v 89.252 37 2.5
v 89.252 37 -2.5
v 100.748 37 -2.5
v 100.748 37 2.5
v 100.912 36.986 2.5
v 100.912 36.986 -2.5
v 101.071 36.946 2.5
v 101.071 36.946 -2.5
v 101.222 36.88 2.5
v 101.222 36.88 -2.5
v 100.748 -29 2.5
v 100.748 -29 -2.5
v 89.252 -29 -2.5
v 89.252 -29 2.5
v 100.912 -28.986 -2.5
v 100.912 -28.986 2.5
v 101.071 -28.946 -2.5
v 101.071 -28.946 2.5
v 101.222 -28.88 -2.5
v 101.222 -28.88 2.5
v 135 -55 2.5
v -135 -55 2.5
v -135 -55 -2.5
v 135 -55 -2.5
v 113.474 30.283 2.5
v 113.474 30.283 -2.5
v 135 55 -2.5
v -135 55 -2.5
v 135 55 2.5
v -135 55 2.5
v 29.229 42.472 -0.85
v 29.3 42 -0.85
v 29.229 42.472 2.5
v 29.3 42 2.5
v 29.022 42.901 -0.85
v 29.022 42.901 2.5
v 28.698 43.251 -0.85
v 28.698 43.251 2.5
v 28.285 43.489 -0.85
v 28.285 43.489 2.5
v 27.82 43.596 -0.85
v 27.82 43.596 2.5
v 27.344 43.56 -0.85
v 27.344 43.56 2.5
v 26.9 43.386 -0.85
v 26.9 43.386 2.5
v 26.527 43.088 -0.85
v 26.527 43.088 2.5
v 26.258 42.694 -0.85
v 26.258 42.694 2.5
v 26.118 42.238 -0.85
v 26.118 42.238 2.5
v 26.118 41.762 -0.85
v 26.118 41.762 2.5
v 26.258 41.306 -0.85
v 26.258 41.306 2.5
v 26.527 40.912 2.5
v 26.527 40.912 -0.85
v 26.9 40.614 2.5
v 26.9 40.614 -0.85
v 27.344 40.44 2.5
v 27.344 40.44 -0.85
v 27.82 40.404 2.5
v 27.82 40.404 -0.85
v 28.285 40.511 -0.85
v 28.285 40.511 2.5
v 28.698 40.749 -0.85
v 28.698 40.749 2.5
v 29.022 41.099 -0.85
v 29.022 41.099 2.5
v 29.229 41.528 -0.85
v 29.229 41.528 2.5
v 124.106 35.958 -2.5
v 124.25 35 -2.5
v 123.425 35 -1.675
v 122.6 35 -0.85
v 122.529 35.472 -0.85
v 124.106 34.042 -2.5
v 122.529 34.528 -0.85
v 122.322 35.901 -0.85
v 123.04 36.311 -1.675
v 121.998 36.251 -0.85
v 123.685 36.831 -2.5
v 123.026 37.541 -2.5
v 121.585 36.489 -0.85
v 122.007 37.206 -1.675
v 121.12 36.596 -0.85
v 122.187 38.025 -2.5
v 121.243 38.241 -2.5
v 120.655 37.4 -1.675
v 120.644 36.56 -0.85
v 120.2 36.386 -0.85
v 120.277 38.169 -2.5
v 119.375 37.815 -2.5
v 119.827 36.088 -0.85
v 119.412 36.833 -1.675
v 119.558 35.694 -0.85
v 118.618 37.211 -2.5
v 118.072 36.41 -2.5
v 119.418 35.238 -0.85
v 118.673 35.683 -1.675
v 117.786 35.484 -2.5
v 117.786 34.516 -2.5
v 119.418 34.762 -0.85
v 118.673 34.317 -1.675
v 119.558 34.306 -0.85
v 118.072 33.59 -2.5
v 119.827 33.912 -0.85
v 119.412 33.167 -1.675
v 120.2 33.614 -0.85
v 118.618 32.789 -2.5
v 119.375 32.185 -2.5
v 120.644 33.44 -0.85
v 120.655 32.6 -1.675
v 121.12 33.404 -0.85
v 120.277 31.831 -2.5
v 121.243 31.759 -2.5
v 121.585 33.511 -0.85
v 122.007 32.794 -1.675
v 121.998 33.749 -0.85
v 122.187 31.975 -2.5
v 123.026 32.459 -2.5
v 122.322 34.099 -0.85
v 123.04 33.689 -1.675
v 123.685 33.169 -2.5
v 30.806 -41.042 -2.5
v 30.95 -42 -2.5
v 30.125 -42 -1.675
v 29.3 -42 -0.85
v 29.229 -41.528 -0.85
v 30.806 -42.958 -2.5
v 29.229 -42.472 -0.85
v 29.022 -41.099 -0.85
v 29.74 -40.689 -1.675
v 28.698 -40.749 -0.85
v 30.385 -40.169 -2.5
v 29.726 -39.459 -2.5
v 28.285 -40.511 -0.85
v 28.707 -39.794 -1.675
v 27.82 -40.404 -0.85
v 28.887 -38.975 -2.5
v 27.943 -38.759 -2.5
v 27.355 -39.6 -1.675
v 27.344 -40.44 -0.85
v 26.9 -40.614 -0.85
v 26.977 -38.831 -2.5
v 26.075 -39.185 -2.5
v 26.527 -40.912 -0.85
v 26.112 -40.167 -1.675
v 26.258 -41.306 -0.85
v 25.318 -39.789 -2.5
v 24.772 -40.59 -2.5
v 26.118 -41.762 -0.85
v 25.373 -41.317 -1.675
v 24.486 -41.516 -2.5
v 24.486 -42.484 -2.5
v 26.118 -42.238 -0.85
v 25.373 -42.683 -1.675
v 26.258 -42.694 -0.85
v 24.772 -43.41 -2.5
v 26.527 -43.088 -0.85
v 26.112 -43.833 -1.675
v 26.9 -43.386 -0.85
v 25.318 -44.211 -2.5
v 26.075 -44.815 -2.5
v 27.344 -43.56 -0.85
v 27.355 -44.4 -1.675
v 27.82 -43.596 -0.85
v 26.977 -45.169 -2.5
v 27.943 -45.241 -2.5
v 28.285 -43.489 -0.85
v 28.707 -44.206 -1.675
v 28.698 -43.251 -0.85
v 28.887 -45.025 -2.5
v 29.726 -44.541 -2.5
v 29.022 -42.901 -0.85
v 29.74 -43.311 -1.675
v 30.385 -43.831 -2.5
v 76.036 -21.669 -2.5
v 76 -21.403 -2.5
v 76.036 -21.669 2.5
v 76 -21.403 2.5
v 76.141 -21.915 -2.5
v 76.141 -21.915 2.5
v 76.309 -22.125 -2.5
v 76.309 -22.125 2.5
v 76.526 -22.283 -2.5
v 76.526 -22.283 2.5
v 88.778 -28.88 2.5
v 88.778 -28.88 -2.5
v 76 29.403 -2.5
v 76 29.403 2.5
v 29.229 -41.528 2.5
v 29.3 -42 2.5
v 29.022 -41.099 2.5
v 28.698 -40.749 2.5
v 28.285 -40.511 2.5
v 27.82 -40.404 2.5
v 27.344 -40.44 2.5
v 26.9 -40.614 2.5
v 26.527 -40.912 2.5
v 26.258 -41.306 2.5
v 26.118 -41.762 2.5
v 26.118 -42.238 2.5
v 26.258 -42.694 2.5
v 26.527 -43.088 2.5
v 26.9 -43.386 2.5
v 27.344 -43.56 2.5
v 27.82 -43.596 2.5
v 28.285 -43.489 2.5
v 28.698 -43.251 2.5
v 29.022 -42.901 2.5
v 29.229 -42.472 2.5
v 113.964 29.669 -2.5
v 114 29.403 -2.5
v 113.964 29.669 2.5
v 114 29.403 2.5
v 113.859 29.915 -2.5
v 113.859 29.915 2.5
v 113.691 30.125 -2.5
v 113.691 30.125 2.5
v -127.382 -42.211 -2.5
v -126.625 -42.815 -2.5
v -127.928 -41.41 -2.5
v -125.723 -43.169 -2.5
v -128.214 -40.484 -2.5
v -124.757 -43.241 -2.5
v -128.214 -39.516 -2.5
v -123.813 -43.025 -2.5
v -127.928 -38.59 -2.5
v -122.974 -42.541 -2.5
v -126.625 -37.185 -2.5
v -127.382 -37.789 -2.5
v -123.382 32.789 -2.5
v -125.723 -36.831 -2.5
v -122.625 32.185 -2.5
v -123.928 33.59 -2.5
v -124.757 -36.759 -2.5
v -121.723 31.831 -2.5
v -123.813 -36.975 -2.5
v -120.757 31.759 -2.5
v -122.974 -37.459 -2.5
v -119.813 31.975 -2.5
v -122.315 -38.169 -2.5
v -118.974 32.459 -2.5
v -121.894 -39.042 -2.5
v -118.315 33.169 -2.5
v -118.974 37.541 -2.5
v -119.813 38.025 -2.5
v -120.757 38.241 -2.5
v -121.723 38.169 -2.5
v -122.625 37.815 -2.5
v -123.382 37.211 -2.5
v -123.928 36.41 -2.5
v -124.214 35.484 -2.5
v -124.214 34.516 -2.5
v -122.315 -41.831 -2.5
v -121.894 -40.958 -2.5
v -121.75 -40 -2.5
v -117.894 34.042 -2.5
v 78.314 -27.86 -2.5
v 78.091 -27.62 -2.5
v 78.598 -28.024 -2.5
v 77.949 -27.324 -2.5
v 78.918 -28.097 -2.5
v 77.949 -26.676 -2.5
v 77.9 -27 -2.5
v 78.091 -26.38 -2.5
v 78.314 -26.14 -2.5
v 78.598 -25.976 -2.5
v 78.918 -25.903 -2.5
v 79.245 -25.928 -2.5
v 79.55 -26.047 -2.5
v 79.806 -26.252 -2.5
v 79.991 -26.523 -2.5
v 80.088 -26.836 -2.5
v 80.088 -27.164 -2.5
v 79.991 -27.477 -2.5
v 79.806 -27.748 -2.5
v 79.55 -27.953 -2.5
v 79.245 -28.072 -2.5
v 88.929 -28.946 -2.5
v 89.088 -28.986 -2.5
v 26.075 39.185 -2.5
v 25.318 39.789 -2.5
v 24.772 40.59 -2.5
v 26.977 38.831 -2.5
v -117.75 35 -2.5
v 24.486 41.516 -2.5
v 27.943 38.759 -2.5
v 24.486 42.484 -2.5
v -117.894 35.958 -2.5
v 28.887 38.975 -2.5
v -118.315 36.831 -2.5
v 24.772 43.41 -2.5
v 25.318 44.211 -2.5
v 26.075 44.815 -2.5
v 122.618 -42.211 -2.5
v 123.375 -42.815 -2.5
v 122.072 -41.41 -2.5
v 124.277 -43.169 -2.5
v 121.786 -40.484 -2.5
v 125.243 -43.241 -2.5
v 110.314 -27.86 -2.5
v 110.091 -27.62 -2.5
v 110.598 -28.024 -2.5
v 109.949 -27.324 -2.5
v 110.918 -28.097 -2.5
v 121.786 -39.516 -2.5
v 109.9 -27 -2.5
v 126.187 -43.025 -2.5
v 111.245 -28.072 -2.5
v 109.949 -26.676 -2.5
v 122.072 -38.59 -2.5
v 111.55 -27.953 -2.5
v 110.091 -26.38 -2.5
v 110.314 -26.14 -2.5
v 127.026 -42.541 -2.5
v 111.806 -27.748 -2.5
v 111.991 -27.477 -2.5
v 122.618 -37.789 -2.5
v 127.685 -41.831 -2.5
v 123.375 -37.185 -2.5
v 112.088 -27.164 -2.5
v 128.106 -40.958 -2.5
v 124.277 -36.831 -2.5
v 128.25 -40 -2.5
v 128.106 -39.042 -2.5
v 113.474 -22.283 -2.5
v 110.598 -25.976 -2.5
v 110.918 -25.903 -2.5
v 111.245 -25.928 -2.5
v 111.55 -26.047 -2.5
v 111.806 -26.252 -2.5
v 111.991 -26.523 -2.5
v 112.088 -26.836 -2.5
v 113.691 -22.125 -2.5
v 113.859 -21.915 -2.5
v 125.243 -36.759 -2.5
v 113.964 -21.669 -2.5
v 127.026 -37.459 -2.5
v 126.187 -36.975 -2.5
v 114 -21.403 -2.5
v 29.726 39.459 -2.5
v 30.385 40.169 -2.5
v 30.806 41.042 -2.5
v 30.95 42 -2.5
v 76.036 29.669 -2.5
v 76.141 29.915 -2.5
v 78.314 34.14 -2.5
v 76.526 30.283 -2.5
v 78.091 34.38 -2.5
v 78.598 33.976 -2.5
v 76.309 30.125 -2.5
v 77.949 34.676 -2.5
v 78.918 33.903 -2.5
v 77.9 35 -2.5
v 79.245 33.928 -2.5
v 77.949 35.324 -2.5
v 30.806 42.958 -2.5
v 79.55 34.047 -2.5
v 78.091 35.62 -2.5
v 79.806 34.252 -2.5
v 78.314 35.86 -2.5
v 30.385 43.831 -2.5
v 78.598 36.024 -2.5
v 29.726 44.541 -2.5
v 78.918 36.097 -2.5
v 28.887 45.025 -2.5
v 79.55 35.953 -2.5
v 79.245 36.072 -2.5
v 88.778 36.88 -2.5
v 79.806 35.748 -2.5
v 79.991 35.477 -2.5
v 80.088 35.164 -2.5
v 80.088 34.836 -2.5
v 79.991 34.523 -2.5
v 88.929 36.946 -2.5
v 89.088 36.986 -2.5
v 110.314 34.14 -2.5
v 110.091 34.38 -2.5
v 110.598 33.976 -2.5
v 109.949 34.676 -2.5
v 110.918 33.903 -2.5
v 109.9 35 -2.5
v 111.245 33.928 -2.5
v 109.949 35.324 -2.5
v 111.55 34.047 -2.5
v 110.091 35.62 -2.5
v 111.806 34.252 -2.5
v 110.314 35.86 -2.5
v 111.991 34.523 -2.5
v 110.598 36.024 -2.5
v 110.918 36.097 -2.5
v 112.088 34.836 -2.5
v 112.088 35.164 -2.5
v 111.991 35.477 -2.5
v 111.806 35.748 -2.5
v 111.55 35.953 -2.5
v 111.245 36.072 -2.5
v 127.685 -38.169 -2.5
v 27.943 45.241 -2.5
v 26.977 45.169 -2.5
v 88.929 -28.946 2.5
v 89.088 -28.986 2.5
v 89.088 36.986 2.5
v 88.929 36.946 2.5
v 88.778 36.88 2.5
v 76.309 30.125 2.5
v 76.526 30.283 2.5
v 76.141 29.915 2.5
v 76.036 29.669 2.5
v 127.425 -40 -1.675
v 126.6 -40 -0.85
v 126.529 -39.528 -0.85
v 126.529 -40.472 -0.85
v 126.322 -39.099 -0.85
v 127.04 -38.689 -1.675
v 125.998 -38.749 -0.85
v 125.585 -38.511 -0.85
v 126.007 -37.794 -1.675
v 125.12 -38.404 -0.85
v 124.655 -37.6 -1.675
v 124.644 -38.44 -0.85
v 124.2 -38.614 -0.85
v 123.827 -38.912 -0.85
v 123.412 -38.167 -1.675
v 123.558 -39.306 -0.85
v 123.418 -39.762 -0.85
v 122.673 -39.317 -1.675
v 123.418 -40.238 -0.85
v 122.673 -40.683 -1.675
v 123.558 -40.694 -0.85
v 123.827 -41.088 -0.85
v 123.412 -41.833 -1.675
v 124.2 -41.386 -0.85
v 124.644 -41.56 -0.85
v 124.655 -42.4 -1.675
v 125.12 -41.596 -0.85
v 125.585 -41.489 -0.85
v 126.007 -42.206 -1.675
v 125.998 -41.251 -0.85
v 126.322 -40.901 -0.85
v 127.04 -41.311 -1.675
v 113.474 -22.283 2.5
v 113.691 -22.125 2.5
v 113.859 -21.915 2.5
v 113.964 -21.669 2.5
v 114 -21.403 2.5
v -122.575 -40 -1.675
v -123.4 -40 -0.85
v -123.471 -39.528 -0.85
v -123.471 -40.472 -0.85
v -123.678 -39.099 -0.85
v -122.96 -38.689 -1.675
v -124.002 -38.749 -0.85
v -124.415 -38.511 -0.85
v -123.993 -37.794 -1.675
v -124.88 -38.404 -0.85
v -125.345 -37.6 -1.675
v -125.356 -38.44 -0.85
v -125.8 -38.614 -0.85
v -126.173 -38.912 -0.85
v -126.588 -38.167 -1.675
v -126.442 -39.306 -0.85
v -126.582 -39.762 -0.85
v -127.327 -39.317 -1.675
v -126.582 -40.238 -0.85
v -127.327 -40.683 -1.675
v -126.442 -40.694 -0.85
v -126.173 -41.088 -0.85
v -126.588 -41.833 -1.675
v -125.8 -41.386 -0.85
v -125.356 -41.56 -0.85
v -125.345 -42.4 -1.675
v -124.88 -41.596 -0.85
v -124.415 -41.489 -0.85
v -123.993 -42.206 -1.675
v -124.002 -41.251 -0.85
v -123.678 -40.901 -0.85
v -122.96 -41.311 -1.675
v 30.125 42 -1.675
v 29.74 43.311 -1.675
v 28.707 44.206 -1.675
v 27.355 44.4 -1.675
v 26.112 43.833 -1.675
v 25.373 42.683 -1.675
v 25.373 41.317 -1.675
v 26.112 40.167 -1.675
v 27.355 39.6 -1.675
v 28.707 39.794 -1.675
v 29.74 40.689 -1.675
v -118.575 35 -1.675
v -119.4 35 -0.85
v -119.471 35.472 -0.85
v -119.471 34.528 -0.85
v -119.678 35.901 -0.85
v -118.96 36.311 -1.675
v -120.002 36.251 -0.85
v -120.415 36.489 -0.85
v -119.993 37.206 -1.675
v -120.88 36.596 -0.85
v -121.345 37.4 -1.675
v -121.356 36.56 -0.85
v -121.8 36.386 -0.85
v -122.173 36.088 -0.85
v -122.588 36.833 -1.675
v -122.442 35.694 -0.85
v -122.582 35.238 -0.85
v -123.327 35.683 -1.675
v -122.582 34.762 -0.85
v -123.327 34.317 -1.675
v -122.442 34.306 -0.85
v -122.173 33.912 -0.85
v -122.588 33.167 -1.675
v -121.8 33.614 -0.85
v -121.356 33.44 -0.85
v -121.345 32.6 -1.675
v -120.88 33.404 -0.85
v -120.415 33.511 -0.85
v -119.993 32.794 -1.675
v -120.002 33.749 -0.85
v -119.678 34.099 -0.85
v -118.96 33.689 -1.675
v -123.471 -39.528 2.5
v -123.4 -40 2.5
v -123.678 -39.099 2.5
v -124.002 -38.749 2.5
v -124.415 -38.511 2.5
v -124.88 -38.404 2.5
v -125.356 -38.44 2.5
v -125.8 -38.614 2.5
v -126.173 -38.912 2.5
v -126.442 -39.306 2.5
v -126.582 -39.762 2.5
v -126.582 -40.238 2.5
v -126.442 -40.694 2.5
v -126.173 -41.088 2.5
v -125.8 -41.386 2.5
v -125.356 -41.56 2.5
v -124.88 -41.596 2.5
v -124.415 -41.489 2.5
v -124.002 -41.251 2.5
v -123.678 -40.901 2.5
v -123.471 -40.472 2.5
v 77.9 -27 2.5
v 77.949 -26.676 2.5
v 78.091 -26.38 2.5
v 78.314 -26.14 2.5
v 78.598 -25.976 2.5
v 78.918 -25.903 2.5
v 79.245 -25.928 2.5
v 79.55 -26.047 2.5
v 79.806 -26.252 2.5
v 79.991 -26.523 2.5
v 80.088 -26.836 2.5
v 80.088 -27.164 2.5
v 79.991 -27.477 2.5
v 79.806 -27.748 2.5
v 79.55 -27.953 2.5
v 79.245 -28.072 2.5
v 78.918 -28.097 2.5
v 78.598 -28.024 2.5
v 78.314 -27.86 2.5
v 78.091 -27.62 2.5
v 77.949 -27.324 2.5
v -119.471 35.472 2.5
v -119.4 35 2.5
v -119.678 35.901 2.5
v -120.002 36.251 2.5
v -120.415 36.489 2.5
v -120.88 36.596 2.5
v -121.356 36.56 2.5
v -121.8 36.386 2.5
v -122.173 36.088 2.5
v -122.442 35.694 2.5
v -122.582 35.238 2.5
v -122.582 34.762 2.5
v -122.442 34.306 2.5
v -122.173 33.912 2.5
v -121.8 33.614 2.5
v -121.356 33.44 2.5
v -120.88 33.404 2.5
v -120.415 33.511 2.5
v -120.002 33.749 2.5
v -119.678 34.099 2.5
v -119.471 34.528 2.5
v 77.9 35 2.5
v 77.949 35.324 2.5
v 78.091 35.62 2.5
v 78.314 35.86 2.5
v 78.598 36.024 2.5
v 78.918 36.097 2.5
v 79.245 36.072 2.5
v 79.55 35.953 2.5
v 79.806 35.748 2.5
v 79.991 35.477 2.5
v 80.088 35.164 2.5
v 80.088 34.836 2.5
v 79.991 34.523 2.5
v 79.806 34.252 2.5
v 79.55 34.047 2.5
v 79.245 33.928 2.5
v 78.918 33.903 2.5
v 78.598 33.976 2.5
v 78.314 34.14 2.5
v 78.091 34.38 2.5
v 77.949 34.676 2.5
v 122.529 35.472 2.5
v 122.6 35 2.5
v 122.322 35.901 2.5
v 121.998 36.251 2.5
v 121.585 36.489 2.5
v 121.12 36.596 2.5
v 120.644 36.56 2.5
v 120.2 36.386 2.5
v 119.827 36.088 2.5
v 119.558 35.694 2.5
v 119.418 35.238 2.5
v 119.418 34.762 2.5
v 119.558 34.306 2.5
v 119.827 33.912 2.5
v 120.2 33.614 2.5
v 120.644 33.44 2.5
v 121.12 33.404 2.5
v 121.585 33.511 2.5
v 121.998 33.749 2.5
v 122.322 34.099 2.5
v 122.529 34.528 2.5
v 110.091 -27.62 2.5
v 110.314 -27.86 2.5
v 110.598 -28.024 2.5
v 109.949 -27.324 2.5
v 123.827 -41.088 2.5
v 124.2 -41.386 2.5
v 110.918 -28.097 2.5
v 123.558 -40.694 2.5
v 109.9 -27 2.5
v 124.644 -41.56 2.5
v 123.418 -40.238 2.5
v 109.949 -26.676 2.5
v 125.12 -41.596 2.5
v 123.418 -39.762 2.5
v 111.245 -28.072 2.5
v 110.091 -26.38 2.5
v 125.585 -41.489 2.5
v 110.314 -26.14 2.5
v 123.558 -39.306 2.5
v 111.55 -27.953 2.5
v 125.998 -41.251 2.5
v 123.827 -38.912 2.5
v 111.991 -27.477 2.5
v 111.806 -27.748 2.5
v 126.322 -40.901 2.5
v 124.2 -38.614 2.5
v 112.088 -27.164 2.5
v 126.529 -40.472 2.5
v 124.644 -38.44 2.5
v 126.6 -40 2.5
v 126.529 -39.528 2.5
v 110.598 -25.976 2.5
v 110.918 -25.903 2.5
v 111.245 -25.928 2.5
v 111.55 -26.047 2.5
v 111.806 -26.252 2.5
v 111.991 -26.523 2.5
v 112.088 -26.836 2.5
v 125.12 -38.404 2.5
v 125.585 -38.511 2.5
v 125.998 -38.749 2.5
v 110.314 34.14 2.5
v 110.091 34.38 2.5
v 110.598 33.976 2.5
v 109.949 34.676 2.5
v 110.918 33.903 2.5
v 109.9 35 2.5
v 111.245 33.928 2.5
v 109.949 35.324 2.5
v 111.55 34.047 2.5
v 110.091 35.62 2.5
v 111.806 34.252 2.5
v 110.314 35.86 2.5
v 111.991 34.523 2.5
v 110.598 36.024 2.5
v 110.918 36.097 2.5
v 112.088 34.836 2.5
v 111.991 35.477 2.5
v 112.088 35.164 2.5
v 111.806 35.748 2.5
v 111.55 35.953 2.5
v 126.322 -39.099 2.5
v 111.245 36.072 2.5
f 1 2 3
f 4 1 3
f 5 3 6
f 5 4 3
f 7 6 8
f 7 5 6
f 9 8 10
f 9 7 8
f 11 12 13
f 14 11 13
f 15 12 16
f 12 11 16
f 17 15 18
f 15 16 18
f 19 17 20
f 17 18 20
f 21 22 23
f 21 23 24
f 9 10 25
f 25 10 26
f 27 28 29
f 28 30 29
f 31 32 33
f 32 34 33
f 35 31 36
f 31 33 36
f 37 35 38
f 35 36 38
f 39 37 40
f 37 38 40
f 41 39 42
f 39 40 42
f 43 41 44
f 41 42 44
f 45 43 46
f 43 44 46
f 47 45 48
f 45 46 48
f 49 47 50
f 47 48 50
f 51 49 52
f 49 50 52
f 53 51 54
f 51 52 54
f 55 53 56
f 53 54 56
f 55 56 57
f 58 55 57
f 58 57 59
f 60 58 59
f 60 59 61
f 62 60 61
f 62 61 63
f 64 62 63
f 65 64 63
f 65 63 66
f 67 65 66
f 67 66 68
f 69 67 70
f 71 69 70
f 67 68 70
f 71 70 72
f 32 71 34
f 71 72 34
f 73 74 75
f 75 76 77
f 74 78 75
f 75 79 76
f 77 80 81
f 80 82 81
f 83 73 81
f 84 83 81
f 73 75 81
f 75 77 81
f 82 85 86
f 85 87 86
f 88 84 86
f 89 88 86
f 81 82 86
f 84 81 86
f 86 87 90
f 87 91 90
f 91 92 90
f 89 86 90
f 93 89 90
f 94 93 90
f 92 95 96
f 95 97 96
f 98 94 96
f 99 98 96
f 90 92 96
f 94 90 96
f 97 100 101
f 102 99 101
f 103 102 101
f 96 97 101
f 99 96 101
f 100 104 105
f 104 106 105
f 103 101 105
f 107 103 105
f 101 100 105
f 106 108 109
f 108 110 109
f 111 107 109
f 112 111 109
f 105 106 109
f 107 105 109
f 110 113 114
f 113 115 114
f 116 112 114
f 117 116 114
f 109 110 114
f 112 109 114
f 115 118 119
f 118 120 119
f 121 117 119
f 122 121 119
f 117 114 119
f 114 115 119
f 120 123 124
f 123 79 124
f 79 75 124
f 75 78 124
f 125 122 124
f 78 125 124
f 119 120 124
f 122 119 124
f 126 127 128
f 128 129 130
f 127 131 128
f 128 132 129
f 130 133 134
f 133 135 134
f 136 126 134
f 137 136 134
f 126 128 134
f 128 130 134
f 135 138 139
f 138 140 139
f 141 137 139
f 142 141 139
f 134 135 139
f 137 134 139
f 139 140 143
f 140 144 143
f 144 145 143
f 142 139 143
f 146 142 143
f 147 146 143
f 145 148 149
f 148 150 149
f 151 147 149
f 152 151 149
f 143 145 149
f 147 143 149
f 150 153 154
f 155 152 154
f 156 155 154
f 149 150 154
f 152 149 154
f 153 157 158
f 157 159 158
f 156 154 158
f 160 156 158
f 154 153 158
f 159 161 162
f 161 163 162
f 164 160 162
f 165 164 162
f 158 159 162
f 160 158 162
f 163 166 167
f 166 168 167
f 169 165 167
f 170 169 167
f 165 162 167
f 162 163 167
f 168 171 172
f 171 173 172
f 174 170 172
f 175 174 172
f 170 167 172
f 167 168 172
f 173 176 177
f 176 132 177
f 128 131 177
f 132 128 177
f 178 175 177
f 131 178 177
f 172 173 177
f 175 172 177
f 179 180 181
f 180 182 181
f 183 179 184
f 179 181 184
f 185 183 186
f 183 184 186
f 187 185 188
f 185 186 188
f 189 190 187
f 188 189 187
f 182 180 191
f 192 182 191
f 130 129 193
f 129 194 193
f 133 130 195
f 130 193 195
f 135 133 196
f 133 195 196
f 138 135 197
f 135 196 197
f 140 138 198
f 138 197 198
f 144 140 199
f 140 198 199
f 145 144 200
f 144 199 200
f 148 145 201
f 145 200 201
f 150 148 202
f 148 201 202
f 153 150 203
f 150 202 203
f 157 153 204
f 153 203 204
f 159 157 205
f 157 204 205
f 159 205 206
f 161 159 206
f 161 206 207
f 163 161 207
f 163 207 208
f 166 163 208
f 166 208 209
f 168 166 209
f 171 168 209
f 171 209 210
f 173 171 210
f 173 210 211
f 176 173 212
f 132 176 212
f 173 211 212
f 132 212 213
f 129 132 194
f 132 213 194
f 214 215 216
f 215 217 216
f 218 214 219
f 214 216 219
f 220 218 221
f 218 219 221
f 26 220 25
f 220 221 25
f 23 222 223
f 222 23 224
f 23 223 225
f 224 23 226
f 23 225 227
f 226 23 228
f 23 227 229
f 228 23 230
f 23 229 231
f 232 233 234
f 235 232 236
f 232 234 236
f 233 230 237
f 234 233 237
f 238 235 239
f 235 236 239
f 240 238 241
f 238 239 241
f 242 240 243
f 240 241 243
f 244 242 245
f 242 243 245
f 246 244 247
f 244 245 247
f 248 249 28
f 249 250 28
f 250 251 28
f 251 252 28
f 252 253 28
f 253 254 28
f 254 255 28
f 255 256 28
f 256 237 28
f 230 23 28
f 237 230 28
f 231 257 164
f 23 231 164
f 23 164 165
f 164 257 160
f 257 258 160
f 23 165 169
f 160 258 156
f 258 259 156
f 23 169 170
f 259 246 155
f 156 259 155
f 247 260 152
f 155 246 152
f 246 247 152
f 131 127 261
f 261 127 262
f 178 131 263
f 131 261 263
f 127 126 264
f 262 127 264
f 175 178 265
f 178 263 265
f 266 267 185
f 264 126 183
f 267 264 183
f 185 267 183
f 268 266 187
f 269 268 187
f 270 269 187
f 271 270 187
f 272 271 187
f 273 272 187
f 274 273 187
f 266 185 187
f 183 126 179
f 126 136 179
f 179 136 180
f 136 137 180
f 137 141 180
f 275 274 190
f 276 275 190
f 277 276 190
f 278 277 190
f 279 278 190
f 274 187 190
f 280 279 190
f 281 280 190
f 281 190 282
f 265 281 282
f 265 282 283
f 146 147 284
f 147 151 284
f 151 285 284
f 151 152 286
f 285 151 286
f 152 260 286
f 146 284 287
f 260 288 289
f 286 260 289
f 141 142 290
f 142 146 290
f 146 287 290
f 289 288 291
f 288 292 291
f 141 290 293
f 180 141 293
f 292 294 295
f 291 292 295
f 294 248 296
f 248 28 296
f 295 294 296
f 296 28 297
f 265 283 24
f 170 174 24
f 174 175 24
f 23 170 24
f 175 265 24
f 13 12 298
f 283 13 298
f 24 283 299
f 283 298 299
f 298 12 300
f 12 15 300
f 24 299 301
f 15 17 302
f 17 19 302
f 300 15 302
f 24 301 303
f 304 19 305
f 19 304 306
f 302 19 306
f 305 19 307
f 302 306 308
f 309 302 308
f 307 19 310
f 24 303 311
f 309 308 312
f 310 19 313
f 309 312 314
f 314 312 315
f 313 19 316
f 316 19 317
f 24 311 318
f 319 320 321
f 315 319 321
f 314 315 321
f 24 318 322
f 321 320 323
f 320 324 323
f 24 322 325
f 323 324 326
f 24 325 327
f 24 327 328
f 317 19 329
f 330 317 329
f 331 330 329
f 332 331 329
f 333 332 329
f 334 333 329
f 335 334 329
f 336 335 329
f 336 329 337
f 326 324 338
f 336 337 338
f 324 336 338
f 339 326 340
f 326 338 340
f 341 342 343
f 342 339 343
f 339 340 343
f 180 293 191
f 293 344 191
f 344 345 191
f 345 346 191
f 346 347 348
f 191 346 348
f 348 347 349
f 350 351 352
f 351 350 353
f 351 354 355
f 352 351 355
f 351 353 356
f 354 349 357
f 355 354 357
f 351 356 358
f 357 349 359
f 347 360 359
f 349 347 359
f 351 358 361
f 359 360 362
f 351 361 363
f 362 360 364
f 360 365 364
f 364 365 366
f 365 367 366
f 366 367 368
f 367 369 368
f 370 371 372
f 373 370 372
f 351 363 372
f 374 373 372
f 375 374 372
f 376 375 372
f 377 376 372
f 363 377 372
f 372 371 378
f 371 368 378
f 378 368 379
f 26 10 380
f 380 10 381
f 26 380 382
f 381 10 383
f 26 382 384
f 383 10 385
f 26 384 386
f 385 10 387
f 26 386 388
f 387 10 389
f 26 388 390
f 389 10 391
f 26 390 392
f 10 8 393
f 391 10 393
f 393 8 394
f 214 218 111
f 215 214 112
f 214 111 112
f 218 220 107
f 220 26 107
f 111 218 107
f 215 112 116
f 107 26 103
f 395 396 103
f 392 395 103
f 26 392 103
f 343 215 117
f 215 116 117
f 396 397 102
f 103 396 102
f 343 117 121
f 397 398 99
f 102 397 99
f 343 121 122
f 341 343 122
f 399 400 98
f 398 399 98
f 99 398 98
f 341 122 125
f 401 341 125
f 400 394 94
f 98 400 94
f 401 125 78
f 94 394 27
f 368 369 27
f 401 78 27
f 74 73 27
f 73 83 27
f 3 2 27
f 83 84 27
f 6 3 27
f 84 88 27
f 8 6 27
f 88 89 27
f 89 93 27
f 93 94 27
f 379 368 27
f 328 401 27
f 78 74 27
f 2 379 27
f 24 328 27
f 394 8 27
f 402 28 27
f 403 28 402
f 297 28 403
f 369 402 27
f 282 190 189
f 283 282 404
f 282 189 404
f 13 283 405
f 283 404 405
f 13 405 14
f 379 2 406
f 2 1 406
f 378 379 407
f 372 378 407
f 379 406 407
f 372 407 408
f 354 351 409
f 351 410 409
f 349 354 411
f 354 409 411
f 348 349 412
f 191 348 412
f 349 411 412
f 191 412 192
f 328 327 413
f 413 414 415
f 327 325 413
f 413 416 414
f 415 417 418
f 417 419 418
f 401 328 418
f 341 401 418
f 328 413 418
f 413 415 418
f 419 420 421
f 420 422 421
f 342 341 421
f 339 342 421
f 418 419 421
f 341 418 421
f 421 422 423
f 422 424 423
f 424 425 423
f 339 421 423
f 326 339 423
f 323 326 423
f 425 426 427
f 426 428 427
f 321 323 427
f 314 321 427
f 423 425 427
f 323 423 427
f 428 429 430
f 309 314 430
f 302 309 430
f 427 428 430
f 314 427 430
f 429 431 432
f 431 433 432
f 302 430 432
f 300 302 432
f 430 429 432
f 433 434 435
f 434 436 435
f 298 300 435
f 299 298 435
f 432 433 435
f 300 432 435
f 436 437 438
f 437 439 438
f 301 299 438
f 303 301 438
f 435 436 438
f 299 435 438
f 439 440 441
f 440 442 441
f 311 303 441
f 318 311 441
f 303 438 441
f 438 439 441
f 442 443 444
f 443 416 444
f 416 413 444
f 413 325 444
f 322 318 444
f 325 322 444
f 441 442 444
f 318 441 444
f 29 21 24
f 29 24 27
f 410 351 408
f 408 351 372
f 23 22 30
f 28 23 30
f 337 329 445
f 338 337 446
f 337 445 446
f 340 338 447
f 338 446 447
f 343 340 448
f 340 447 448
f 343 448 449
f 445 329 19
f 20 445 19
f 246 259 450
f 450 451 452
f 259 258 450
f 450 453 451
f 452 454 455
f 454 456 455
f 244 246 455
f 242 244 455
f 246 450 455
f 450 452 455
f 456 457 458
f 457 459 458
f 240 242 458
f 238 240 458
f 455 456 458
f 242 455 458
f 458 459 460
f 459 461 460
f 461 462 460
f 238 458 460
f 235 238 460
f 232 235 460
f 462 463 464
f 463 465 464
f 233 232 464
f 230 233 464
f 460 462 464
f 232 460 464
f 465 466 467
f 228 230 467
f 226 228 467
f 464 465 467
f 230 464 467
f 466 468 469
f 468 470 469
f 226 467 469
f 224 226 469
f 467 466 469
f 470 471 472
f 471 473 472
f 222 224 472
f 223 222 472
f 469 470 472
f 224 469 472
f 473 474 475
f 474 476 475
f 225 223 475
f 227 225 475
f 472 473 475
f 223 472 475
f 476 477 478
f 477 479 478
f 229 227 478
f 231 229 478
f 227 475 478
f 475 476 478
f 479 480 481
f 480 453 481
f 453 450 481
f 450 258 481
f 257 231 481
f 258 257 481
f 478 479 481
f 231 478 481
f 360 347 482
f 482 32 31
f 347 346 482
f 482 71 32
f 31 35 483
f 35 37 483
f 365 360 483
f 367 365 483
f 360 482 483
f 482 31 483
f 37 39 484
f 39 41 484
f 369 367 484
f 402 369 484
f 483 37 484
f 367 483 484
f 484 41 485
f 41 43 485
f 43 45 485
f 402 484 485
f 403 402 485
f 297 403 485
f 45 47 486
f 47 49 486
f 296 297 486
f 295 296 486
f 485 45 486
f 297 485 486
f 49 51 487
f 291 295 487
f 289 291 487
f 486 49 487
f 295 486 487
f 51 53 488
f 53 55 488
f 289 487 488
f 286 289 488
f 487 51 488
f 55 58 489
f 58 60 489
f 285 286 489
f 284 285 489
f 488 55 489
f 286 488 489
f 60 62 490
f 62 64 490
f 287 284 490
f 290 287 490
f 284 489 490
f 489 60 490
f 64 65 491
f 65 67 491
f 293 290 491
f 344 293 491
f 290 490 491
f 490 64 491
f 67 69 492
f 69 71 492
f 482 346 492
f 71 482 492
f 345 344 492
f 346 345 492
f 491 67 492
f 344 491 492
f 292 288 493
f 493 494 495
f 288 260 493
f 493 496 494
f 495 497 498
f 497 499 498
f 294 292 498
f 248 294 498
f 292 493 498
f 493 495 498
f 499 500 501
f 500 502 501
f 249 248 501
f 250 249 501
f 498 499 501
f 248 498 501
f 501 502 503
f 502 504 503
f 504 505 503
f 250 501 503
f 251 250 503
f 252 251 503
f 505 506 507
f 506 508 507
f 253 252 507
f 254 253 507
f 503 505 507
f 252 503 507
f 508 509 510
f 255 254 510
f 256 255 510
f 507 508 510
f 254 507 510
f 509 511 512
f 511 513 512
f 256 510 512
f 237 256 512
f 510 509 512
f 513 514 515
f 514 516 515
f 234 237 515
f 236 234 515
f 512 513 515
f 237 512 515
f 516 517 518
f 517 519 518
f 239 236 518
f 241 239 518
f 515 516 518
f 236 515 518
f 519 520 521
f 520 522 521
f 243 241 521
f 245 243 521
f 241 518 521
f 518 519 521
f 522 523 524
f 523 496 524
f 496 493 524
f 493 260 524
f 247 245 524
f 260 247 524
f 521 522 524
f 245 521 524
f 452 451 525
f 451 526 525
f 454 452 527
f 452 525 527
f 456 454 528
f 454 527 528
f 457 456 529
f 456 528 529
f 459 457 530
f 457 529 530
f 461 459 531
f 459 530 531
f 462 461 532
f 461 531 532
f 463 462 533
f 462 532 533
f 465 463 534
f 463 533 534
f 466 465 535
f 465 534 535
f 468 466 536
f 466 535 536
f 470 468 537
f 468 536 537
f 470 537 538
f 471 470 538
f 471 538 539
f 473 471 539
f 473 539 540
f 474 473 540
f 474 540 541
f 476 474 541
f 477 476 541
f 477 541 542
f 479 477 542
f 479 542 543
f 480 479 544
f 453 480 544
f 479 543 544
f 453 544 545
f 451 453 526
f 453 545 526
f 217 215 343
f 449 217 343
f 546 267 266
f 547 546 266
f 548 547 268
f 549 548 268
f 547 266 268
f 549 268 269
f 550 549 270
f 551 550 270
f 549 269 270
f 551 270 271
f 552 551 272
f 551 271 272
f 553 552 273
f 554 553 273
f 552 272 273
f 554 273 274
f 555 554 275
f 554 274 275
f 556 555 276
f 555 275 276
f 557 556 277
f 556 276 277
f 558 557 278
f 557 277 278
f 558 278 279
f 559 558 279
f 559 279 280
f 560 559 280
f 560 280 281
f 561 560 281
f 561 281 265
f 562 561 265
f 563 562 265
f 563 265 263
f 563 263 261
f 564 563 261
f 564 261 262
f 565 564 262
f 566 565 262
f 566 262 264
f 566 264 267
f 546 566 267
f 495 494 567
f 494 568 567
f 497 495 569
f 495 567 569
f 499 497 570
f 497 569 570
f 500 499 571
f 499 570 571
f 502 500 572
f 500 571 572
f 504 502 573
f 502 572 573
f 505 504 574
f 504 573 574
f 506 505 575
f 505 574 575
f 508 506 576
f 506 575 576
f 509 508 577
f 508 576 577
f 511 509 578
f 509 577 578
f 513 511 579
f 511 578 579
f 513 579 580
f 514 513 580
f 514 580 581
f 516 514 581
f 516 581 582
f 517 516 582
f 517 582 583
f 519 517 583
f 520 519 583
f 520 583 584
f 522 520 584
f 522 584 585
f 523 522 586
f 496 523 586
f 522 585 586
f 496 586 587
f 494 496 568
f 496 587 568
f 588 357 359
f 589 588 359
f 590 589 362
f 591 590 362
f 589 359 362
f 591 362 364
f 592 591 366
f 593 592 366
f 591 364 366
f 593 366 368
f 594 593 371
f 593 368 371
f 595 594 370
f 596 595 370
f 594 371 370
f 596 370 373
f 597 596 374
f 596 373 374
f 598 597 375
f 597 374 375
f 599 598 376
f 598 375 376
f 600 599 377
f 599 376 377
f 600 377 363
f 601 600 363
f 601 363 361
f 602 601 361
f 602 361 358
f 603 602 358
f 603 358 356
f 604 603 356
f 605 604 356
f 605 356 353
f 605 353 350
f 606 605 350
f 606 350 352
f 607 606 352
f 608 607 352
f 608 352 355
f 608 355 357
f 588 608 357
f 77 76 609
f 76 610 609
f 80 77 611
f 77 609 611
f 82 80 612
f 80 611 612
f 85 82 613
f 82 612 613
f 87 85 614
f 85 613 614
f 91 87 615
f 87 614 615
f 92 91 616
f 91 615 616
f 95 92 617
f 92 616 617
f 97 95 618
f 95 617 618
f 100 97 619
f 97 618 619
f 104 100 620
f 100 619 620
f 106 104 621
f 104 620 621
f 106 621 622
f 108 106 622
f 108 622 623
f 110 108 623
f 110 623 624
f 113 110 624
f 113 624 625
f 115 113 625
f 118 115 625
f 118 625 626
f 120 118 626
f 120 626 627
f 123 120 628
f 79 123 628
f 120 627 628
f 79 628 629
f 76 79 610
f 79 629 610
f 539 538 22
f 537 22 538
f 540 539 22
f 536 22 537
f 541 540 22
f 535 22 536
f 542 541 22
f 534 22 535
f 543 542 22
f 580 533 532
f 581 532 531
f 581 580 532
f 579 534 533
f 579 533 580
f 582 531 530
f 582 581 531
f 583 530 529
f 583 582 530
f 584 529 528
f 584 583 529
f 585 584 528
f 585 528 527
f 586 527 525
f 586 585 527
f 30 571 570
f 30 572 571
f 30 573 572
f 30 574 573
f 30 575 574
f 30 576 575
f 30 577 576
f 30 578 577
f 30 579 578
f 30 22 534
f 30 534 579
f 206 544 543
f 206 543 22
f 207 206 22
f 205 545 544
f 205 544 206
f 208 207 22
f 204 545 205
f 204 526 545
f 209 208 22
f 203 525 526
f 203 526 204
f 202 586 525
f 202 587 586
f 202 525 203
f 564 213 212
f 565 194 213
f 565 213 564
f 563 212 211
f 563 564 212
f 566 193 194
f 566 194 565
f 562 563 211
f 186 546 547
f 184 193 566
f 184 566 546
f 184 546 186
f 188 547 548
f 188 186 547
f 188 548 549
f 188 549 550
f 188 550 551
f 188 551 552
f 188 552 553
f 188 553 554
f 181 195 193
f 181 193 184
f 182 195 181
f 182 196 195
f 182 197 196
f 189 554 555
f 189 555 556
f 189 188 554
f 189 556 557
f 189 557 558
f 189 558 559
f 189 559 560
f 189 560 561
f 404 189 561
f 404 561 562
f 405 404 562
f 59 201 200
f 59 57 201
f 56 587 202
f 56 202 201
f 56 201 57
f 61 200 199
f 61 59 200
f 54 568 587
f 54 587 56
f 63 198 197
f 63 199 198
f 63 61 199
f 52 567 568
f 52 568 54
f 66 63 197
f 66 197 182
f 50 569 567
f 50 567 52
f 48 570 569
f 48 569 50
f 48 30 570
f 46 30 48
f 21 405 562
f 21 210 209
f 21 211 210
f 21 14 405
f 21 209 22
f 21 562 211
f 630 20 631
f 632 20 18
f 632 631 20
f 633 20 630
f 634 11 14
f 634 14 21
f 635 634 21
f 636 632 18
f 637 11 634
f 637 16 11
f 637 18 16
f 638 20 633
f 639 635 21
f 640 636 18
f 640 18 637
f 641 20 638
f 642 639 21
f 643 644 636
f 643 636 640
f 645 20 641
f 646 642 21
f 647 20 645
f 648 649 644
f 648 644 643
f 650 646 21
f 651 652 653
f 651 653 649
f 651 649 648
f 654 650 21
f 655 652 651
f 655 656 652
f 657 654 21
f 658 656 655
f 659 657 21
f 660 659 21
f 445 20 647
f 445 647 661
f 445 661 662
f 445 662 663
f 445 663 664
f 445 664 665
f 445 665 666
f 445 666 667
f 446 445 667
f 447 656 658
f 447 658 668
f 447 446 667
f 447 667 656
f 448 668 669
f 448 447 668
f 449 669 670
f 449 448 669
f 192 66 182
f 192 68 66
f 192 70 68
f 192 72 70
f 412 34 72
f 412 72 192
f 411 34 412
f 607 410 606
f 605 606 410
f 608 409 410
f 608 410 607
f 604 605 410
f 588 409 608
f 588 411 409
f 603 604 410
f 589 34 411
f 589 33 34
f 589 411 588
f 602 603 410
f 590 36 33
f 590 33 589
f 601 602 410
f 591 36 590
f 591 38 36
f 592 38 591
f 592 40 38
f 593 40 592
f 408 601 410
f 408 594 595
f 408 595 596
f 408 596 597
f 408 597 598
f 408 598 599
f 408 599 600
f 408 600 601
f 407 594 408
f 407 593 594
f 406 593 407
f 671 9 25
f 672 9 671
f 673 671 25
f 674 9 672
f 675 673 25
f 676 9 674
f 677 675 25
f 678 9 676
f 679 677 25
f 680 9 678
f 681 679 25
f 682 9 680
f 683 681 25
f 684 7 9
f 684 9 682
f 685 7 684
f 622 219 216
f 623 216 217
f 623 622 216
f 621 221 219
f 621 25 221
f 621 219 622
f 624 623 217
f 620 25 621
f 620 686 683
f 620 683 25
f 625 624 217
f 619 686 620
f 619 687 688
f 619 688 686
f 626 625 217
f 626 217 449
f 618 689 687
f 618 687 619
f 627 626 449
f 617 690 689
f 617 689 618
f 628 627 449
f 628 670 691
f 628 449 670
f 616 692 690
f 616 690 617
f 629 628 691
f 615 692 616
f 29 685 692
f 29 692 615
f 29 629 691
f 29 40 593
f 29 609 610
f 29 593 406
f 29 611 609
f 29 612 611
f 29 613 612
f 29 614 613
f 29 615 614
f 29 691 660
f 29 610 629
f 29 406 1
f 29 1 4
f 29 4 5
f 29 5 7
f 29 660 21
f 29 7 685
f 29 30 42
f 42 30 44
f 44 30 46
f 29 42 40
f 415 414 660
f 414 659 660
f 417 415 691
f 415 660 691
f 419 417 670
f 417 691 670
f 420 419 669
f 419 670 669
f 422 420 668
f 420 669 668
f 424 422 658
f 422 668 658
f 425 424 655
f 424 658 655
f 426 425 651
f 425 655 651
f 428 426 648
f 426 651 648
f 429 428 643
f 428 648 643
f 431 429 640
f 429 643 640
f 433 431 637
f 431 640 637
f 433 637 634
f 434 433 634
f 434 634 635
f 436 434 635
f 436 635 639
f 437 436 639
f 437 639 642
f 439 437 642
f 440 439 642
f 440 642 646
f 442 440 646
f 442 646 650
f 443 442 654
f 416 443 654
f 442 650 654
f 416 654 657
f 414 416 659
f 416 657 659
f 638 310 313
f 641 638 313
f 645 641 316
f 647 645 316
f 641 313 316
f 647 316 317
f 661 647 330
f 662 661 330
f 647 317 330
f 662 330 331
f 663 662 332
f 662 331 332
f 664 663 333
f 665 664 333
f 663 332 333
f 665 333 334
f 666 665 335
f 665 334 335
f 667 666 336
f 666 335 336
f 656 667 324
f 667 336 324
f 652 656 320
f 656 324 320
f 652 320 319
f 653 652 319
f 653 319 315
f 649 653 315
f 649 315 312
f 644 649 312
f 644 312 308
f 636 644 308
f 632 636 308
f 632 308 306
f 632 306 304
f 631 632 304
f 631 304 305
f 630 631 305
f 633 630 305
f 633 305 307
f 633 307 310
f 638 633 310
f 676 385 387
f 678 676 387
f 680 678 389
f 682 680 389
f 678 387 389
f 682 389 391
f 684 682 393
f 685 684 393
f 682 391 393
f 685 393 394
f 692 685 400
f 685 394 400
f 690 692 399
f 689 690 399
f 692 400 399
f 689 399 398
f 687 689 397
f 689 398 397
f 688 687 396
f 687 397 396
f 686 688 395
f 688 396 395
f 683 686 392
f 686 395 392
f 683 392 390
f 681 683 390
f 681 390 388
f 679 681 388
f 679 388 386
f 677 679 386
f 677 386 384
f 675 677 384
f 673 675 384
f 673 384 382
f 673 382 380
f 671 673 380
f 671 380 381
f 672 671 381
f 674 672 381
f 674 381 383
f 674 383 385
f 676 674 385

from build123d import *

# Parameters (mm, degrees)
SKETCH1_W                             = 270
SKETCH1_H                             = 110
SHEET_DEPTH                           = 2.5
SKETCH4_R                             = 1.1
CUT_EXTRUDE1_DEPTH                    = 6
FILLET1_R                             = 1
F_3_2_3_2_MOUNTHOLES_D                = 3.2
F_3_2_3_2_MOUNTHOLES_CSINK_D          = 6.5
F_3_2_3_2_MOUNTHOLES_CSINK_ANGLE      = 90
F_3_2_3_2_MIDDLEPARTHOLES_D           = 3.2
F_3_2_3_2_MIDDLEPARTHOLES_CSINK_D     = 6.5
F_3_2_3_2_MIDDLEPARTHOLES_CSINK_ANGLE = 90


with BuildPart() as part:
    # Sketch1 → Sheet (new body, symmetric)
    with BuildSketch(Plane.XY):
        Rectangle(SKETCH1_W, SKETCH1_H)
    extrude(amount=SHEET_DEPTH, both=True)

    # Sketch4 → Cut-Extrude1 (cut, through all)
    with BuildSketch(Plane(origin=(0, 0, -2.5), x_dir=(-1, 0, 0), z_dir=(0, 0, -1))):
        with Locations((-79, 35)):
            Circle(SKETCH4_R)
        with Locations((-111, 35)):
            Circle(SKETCH4_R)
        with Locations((-111, -27)):
            Circle(SKETCH4_R)
        with Locations((-79, -27)):
            Circle(SKETCH4_R)
        Polygon((-101, 37), (-114, 30), (-114, -22), (-101, -29), (-89, -29), (-76, -22), (-76, 30), (-89, 37), align=None)
    extrude(amount=-CUT_EXTRUDE1_DEPTH, mode=Mode.SUBTRACT)

    # Fillet1
    fillet1_edges = [part.edges().sort_by_distance(p)[0] for p in [
        (89, 37, 0),
        (76, 30, 0),
        (76, -22, 0),
        (89, -29, 0),
        (101, -29, 0),
        (114, -22, 0),
        (114, 30, 0),
        (101, 37, 0),
    ]]
    fillet(fillet1_edges, radius=FILLET1_R)

    # Ø3.2 (3.2) MountHoles (through all)
    with Locations(Plane(origin=(0, 0, -2.5), x_dir=(-1, 0, 0), z_dir=(0, 0, -1))):
        with Locations((-121, 35), (-125, -40), (125, -40), (121, 35)):
            CounterSinkHole(F_3_2_3_2_MOUNTHOLES_D / 2, F_3_2_3_2_MOUNTHOLES_CSINK_D / 2, counter_sink_angle=F_3_2_3_2_MOUNTHOLES_CSINK_ANGLE)

    # Ø3.2 (3.2) MiddlePartHoles (through all)
    with Locations(Plane(origin=(0, 0, -2.5), x_dir=(-1, 0, 0), z_dir=(0, 0, -1))):
        with Locations((-27.7, 42), (-27.7, -42)):
            CounterSinkHole(F_3_2_3_2_MIDDLEPARTHOLES_D / 2, F_3_2_3_2_MIDDLEPARTHOLES_CSINK_D / 2, counter_sink_angle=F_3_2_3_2_MIDDLEPARTHOLES_CSINK_ANGLE)


solid = part.part
